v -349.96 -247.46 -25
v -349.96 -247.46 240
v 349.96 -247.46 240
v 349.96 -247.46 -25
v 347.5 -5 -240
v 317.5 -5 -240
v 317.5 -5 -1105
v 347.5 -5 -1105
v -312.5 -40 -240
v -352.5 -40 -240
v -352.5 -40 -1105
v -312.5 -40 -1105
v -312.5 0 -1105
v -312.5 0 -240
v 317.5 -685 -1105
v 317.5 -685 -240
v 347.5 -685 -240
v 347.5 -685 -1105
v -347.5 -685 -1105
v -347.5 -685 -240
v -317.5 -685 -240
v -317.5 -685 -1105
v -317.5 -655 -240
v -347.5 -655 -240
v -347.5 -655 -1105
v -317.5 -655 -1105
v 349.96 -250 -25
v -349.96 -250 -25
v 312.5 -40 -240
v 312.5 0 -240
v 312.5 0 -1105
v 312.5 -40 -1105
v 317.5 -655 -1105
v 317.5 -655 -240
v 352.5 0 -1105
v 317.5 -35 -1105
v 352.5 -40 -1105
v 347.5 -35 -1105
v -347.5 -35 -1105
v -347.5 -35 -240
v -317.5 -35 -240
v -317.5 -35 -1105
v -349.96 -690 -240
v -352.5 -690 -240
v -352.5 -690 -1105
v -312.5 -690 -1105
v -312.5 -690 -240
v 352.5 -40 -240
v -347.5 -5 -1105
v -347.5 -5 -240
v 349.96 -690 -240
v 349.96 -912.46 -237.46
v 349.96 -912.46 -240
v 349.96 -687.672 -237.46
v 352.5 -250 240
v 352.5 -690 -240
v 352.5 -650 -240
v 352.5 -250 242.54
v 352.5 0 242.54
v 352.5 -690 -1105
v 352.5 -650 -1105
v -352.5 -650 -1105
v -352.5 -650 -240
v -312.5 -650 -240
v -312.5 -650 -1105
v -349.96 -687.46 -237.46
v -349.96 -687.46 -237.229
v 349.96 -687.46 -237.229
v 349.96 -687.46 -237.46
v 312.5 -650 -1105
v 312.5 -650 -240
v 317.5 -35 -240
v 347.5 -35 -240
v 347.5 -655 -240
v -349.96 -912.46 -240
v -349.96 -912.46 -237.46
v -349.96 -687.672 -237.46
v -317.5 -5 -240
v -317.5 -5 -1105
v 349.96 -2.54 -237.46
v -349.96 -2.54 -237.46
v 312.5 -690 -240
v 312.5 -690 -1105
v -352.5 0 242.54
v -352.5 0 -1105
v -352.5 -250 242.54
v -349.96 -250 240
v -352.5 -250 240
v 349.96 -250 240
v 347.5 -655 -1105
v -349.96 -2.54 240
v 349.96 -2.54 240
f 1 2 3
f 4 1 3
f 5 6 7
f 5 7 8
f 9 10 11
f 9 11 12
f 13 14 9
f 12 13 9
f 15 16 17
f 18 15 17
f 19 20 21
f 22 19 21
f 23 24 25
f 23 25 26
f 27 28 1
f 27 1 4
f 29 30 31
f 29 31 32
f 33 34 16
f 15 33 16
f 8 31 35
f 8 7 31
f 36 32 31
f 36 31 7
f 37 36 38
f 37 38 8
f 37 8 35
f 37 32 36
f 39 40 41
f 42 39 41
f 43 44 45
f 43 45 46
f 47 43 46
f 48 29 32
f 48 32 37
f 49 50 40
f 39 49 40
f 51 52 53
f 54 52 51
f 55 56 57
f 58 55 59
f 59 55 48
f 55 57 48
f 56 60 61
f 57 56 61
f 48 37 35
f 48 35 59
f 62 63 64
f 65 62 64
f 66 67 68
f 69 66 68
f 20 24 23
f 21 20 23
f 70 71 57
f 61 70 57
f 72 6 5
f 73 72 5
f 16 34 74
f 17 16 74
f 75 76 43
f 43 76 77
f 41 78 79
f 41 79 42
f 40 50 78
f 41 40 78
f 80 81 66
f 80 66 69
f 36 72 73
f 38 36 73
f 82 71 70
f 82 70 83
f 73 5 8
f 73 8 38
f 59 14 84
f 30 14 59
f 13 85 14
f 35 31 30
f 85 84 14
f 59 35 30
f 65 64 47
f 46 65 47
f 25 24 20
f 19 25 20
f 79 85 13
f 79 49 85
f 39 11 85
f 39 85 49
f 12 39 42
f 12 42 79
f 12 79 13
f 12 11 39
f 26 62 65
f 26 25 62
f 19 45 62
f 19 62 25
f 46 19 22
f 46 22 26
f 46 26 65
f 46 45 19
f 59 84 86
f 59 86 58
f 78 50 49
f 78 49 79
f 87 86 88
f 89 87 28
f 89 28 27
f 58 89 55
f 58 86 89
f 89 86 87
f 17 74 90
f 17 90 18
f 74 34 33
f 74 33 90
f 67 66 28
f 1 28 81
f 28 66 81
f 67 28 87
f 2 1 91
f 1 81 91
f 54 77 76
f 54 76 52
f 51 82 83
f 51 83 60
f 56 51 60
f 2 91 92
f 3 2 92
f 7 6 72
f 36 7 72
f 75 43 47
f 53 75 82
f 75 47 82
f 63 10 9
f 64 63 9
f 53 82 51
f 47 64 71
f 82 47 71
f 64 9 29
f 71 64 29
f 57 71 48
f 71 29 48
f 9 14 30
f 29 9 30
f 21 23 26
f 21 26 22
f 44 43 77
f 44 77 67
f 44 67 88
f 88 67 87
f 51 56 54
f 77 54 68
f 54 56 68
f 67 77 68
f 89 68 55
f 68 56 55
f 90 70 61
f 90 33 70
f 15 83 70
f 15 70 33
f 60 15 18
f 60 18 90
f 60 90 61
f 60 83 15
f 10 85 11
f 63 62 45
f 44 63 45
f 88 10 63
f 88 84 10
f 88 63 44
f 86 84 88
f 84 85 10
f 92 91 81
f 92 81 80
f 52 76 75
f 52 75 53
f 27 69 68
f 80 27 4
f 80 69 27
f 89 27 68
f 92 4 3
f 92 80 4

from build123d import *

# Parameters (mm, degrees)
F0_W      = 705
F0_H      = 480
F1_DEPTH  = 690
F4_T      = -2.54
F5_DEPTH  = 705
F2_W      = 705
F2_H      = 250
F6_DEPTH  = 2.54
F7_W      = 699.92
F7_H      = 2.54
F8_DEPTH  = 265
F9_W      = 40
F9_H      = 40
F9_W_2    = 30
F9_H_2    = 30
F10_DEPTH = 865
F11_W     = 699.92
F11_H     = 225
F12_DEPTH = 2.54


with BuildPart() as f1:
    # F0 (on Front) → F1 (new body)
    with BuildSketch(Plane.XZ):
        Rectangle(F0_W, F0_H)
    extrude(amount=F1_DEPTH)

    # F4
    f4_openings = [f1.faces().sort_by_distance(p)[0] for p in [
        (0, -345, 240),
    ]]
    offset(amount=F4_T, openings=f4_openings)

    # F3 (on face) → F5 (cut, through all)
    with BuildSketch(Plane.YZ.offset(352.5)):
        Polygon((-690, -240), (-250, 240), (-690, 240), align=None)
    extrude(amount=-F5_DEPTH, mode=Mode.SUBTRACT)

    # F2 (on face) → F6 (join)
    with BuildSketch(Plane.XY.offset(240)):
        with Locations((0, -125)):
            Rectangle(F2_W, F2_H)
    extrude(amount=F6_DEPTH)

    # F7 (on face) → F8 (join)
    with BuildSketch(Plane(origin=(0, 0, 240), x_dir=(1, 0, 0), z_dir=(0, 0, -1))):
        with Locations((0, 248.73)):
            Rectangle(F7_W, F7_H)
    extrude(amount=F8_DEPTH)

    # F9 (on face) → F10 (join)
    with BuildSketch(Plane(origin=(0, 0, -240), x_dir=(1, 0, 0), z_dir=(0, 0, -1))):
        with Locations((-332.5, 670)):
            Rectangle(F9_W, F9_H)
        with Locations((-332.5, 670)):
            Rectangle(F9_W_2, F9_H_2, mode=Mode.SUBTRACT)
        with Locations((-332.5, 20)):
            Rectangle(F9_W, F9_H)
        with Locations((-332.5, 20)):
            Rectangle(F9_W_2, F9_H_2, mode=Mode.SUBTRACT)
        with Locations((332.5, 20)):
            Rectangle(F9_W, F9_H)
        with Locations((332.5, 20)):
            Rectangle(F9_W_2, F9_H_2, mode=Mode.SUBTRACT)
        with Locations((332.5, 670)):
            Rectangle(F9_W, F9_H)
        with Locations((332.5, 670)):
            Rectangle(F9_W_2, F9_H_2, mode=Mode.SUBTRACT)
    extrude(amount=F10_DEPTH)

    # F11 (on face) → F12 (join)
    with BuildSketch(Plane.XY.offset(-237.46)):
        with Locations((0, -799.96)):
            Rectangle(F11_W, F11_H)
    extrude(amount=-F12_DEPTH)


solid = f1.part
